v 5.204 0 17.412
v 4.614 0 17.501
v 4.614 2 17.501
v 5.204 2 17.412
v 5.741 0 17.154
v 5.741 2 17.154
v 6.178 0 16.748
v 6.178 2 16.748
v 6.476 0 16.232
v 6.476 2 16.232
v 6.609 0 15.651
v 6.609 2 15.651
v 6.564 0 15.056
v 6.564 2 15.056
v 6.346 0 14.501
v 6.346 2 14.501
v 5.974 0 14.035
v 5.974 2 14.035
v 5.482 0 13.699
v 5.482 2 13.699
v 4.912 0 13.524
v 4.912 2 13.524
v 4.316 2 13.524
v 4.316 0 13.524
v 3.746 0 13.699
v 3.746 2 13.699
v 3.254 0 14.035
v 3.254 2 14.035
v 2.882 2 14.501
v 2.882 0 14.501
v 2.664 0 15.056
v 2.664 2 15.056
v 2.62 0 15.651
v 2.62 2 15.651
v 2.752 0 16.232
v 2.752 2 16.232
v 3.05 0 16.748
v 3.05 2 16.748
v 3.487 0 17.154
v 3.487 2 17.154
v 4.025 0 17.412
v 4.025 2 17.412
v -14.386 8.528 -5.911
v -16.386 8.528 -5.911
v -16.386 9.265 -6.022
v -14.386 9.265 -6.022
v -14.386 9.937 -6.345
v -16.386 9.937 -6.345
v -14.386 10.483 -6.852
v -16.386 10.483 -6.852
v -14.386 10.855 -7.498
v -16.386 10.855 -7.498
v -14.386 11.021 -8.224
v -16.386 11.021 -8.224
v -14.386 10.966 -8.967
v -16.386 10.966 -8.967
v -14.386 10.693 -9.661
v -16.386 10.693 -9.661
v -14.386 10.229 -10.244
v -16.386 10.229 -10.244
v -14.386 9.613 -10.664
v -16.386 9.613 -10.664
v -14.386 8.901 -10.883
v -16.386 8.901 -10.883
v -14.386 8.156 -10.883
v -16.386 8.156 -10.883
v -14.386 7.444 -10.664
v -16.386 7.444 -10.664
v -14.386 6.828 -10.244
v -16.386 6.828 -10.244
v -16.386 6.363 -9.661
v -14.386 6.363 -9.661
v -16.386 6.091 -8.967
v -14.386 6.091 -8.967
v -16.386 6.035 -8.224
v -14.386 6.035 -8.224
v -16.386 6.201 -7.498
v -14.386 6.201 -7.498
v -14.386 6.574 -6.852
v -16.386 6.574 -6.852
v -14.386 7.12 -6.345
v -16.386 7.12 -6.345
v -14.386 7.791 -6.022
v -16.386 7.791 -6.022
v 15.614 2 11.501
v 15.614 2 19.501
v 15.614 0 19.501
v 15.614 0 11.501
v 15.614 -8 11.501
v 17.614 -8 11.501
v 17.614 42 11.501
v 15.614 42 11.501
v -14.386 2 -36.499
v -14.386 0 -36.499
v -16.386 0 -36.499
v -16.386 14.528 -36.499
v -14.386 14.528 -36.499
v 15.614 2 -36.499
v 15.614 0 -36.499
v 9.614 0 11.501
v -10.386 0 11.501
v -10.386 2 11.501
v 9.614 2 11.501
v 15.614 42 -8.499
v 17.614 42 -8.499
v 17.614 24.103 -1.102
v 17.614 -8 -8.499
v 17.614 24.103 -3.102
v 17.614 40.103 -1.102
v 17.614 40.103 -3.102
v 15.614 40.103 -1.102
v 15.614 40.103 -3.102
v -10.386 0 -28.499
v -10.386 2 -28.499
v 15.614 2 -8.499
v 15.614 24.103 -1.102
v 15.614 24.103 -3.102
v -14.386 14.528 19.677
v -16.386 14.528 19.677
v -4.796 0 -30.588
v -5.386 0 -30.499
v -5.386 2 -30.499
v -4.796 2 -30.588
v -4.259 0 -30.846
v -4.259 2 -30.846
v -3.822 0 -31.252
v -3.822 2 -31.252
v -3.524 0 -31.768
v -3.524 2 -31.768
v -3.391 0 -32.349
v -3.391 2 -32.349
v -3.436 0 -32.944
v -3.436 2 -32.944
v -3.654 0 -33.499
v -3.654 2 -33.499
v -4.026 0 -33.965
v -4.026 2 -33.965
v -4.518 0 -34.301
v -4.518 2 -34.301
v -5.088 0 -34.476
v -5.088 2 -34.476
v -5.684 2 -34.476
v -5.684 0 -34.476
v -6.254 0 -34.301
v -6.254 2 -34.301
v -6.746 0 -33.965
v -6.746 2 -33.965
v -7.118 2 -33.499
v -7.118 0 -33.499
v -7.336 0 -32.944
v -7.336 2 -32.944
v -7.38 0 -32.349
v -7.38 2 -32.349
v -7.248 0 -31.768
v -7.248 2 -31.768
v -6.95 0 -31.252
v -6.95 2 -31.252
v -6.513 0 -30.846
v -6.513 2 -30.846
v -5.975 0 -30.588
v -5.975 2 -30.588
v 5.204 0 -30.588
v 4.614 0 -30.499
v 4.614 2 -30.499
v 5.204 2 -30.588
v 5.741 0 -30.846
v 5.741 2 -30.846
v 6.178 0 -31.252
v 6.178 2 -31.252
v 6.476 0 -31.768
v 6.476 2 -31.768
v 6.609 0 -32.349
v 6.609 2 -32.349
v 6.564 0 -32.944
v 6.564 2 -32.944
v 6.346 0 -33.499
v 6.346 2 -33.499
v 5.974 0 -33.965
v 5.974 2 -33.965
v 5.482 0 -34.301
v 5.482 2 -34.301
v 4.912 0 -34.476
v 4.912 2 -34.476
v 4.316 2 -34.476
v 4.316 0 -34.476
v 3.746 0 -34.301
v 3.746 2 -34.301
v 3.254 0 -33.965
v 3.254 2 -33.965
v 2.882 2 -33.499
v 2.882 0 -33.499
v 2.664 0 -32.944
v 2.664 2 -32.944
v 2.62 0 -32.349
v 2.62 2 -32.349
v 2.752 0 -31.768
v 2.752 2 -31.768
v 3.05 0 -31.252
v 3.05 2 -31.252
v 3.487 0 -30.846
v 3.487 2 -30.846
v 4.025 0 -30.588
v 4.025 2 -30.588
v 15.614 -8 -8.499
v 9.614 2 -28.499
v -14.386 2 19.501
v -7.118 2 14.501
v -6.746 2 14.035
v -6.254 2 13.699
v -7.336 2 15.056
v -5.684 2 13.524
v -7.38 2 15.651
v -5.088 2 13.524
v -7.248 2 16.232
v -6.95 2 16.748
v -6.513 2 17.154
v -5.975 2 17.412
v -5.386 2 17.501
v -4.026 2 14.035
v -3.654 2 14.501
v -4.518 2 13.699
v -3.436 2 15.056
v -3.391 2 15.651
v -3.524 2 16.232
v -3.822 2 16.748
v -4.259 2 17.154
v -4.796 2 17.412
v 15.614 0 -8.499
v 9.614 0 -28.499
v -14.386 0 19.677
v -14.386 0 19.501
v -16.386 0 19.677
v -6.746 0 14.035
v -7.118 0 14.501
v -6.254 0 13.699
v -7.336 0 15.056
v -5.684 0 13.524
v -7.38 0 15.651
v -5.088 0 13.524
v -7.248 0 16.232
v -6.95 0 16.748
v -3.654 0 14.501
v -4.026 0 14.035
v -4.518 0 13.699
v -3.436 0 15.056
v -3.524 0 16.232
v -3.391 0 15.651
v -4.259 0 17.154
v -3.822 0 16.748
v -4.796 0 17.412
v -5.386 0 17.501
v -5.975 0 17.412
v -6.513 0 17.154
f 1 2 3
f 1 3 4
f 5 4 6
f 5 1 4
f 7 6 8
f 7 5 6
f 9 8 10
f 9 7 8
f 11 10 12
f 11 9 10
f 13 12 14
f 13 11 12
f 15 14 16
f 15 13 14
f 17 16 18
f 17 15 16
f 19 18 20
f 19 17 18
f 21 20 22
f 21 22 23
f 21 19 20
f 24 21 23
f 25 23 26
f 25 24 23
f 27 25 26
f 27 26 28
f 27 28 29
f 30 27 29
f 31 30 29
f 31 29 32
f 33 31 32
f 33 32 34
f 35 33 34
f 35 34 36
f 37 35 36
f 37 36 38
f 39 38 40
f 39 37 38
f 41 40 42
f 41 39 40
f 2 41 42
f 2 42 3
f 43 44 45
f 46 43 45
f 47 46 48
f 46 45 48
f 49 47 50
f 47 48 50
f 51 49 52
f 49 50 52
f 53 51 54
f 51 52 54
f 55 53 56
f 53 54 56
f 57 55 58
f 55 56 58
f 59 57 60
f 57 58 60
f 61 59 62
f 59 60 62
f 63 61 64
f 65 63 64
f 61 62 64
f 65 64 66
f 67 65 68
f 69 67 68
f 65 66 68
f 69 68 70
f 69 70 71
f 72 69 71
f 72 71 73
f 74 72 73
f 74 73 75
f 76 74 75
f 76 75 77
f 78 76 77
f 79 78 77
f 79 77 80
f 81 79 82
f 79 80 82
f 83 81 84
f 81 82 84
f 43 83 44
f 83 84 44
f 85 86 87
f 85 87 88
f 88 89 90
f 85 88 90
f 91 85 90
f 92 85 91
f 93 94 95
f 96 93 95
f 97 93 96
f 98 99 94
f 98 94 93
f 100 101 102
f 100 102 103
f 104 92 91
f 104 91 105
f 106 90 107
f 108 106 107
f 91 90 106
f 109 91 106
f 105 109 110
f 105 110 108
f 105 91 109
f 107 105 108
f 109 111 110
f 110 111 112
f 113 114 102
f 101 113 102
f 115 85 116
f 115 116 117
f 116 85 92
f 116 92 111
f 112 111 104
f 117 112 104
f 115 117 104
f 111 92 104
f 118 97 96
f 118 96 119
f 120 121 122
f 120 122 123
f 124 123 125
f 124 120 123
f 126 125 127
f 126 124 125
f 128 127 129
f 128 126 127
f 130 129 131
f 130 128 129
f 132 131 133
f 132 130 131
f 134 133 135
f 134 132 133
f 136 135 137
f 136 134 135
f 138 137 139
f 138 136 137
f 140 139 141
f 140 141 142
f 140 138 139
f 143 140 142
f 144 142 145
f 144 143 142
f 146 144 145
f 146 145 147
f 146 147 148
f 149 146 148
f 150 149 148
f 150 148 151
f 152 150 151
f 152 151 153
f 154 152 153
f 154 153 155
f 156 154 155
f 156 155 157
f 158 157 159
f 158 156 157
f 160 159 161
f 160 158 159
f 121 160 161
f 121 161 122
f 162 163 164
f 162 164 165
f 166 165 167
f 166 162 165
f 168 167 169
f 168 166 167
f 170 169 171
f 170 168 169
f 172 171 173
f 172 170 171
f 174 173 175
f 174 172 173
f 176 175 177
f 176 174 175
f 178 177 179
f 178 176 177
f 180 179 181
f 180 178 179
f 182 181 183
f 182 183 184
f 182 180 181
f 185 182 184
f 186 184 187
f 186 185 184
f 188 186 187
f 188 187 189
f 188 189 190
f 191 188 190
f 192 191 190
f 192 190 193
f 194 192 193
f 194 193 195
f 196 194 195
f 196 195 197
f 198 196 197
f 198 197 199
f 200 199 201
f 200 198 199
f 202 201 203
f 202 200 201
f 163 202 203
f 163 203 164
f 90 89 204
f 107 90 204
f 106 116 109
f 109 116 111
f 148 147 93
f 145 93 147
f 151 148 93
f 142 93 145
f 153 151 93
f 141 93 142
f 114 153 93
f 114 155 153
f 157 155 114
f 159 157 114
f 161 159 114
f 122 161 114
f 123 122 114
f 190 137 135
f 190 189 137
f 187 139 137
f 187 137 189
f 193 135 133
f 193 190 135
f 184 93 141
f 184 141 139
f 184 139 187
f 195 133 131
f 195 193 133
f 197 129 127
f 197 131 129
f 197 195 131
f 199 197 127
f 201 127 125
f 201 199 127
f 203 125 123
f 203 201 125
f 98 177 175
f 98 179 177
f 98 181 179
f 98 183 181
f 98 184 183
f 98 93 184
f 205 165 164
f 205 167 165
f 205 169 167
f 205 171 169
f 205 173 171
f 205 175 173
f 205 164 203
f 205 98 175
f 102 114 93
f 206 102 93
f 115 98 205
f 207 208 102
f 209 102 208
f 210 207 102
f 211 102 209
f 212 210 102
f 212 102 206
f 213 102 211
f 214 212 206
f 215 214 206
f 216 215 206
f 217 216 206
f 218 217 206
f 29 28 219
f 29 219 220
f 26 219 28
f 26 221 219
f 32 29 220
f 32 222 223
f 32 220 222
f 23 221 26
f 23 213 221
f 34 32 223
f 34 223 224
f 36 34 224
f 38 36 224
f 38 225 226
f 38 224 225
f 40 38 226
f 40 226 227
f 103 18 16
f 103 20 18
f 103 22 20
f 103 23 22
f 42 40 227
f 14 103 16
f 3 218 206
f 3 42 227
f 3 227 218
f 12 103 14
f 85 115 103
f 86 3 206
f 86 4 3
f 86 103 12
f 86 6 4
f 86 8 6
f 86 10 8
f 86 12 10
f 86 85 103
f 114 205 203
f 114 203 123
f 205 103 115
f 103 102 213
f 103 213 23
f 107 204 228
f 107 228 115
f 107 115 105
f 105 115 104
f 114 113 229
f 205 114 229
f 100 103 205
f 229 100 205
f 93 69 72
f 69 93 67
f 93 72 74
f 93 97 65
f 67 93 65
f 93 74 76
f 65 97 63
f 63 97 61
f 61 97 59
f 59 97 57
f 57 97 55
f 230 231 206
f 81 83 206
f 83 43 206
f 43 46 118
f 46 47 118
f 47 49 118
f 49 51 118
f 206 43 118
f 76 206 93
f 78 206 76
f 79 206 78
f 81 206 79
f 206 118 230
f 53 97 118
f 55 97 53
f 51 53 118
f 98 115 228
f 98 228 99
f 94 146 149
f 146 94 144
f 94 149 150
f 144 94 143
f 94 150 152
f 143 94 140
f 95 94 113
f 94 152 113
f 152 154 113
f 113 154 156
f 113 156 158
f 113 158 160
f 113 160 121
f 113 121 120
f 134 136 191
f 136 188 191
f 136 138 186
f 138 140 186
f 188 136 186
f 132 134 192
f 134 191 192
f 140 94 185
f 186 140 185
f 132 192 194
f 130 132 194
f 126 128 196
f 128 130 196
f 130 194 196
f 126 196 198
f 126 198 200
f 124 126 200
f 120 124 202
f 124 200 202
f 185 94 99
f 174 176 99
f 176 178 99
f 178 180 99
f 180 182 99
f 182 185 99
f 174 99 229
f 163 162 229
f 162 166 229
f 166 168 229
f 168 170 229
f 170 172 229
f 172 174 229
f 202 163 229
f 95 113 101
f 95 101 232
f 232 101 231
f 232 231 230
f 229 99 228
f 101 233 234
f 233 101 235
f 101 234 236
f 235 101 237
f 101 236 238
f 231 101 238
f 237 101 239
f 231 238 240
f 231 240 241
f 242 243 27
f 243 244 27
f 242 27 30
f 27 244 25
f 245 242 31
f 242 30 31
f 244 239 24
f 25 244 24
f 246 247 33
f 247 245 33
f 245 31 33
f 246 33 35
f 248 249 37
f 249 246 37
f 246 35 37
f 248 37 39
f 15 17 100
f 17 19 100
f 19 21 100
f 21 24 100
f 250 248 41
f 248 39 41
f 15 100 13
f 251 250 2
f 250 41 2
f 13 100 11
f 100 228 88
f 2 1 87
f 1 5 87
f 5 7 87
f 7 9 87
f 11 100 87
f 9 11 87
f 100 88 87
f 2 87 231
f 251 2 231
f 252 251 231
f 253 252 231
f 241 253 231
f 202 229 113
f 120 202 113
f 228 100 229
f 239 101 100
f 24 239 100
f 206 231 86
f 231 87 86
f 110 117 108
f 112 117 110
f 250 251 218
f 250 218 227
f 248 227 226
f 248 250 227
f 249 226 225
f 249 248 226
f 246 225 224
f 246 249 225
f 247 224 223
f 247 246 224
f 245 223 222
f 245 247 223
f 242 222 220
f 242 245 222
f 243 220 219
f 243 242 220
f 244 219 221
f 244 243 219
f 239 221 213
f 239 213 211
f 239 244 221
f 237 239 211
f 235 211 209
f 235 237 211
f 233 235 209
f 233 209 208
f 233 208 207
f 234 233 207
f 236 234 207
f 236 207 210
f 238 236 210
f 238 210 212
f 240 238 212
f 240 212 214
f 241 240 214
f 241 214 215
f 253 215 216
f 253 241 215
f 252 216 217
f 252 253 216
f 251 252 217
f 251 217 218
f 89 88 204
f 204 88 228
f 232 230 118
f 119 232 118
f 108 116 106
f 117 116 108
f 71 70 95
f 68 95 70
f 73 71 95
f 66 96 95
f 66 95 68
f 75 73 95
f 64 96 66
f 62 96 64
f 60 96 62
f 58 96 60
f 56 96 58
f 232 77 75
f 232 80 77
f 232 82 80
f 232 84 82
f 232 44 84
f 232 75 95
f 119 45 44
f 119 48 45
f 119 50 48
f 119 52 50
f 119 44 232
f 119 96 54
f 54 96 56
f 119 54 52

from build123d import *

# Parameters (mm, degrees)
SKETCH1_W             = 20
SKETCH1_H             = 8
SKETCH1_R             = 2
BOSS_EXTRUDE1_DEPTH   = 2
BOSS_EXTRUDE1_2_DEPTH = 2
SKETCH6_W             = 56
SKETCH6_H             = 2
BOSS_EXTRUDE5_DEPTH   = 6
SKETCH10_W            = 56
SKETCH10_H            = 2
BOSS_EXTRUDE7_DEPTH   = 4
SKETCH11_W            = 56.175194469
SKETCH11_H            = 14.528307745
BOSS_EXTRUDE8_DEPTH   = 2
SKETCH12_R            = 2.5
CUT_EXTRUDE3_DEPTH    = 2
SKETCH13_W            = 20
SKETCH13_H            = 50
SKETCH13_W_2          = 2
SKETCH13_H_2          = 16
BOSS_EXTRUDE9_DEPTH   = 2


with BuildPart() as part:
    # Sketch1 → Boss-Extrude1 (new body)
    with BuildSketch(Plane(origin=(0, 0, 0), x_dir=(1, 0, 0), z_dir=(0, 1, 0))):
        with Locations((-0.385906166, -15.501316712)):
            Rectangle(SKETCH1_W, SKETCH1_H)
        with Locations(Location((4.614093834, -15.501316712, 0), (0, 0, 270))):
            Circle(SKETCH1_R, mode=Mode.SUBTRACT)
        with Locations(Location((-5.385906166, -15.501316712, 0), (0, 0, 270))):
            Circle(SKETCH1_R, mode=Mode.SUBTRACT)
    extrude(amount=BOSS_EXTRUDE1_DEPTH)



with BuildPart() as body_2:
    # Sketch1 → Boss-Extrude1 2 (new body)
    with BuildSketch(Plane(origin=(0, 0, 0), x_dir=(1, 0, 0), z_dir=(0, 1, 0))):
        with Locations((-0.385906166, 32.498683288)):
            Rectangle(SKETCH1_W, SKETCH1_H)
        with Locations(Location((4.614093834, 32.498683288, 0), (0, 0, 270))):
            Circle(SKETCH1_R, mode=Mode.SUBTRACT)
        with Locations(Location((-5.385906166, 32.498683288, 0), (0, 0, 270))):
            Circle(SKETCH1_R, mode=Mode.SUBTRACT)
    extrude(amount=BOSS_EXTRUDE1_2_DEPTH)


with BuildPart() as part_1:
    add(part.part)

    add(body_2.part)  # Boss-Extrude5 merges body 2
    # Sketch6 → Boss-Extrude5 (add)
    with BuildSketch(Plane(origin=(9.614093834, 0, 0), x_dir=(0, 0, -1), z_dir=(1, 0, 0))):
        with Locations((8.498683288, 1)):
            Rectangle(SKETCH6_W, SKETCH6_H)
    extrude(amount=BOSS_EXTRUDE5_DEPTH)

    # Sketch10 → Boss-Extrude7 (add)
    with BuildSketch(Plane.ZY.offset(10.385906166)):
        with Locations((-8.498683288, 1)):
            Rectangle(SKETCH10_W, SKETCH10_H)
    extrude(amount=BOSS_EXTRUDE7_DEPTH)

    # Sketch11 → Boss-Extrude8 (add)
    with BuildSketch(Plane.ZY.offset(14.385906166)):
        with Locations((-8.411086054, 7.264153873)):
            Rectangle(SKETCH11_W, SKETCH11_H)
    extrude(amount=BOSS_EXTRUDE8_DEPTH)

    # Sketch12 → Cut-Extrude3 (cut)
    with BuildSketch(Plane.ZY.offset(16.385906166)):
        with Locations((-8.411086053, 8.528307745)):
            Circle(SKETCH12_R)
    extrude(amount=-CUT_EXTRUDE3_DEPTH, mode=Mode.SUBTRACT)

    # Sketch13 → Boss-Extrude9 (add)
    with BuildSketch(Plane(origin=(15.614093834, 0, 0), x_dir=(0, 0, -1), z_dir=(1, 0, 0))):
        with Locations((-1.501316712, 17)):
            Rectangle(SKETCH13_W, SKETCH13_H)
        with Locations((2.10225409, 32.102958265)):
            Rectangle(SKETCH13_W_2, SKETCH13_H_2, mode=Mode.SUBTRACT)
    extrude(amount=BOSS_EXTRUDE9_DEPTH)


solid = part_1.part
